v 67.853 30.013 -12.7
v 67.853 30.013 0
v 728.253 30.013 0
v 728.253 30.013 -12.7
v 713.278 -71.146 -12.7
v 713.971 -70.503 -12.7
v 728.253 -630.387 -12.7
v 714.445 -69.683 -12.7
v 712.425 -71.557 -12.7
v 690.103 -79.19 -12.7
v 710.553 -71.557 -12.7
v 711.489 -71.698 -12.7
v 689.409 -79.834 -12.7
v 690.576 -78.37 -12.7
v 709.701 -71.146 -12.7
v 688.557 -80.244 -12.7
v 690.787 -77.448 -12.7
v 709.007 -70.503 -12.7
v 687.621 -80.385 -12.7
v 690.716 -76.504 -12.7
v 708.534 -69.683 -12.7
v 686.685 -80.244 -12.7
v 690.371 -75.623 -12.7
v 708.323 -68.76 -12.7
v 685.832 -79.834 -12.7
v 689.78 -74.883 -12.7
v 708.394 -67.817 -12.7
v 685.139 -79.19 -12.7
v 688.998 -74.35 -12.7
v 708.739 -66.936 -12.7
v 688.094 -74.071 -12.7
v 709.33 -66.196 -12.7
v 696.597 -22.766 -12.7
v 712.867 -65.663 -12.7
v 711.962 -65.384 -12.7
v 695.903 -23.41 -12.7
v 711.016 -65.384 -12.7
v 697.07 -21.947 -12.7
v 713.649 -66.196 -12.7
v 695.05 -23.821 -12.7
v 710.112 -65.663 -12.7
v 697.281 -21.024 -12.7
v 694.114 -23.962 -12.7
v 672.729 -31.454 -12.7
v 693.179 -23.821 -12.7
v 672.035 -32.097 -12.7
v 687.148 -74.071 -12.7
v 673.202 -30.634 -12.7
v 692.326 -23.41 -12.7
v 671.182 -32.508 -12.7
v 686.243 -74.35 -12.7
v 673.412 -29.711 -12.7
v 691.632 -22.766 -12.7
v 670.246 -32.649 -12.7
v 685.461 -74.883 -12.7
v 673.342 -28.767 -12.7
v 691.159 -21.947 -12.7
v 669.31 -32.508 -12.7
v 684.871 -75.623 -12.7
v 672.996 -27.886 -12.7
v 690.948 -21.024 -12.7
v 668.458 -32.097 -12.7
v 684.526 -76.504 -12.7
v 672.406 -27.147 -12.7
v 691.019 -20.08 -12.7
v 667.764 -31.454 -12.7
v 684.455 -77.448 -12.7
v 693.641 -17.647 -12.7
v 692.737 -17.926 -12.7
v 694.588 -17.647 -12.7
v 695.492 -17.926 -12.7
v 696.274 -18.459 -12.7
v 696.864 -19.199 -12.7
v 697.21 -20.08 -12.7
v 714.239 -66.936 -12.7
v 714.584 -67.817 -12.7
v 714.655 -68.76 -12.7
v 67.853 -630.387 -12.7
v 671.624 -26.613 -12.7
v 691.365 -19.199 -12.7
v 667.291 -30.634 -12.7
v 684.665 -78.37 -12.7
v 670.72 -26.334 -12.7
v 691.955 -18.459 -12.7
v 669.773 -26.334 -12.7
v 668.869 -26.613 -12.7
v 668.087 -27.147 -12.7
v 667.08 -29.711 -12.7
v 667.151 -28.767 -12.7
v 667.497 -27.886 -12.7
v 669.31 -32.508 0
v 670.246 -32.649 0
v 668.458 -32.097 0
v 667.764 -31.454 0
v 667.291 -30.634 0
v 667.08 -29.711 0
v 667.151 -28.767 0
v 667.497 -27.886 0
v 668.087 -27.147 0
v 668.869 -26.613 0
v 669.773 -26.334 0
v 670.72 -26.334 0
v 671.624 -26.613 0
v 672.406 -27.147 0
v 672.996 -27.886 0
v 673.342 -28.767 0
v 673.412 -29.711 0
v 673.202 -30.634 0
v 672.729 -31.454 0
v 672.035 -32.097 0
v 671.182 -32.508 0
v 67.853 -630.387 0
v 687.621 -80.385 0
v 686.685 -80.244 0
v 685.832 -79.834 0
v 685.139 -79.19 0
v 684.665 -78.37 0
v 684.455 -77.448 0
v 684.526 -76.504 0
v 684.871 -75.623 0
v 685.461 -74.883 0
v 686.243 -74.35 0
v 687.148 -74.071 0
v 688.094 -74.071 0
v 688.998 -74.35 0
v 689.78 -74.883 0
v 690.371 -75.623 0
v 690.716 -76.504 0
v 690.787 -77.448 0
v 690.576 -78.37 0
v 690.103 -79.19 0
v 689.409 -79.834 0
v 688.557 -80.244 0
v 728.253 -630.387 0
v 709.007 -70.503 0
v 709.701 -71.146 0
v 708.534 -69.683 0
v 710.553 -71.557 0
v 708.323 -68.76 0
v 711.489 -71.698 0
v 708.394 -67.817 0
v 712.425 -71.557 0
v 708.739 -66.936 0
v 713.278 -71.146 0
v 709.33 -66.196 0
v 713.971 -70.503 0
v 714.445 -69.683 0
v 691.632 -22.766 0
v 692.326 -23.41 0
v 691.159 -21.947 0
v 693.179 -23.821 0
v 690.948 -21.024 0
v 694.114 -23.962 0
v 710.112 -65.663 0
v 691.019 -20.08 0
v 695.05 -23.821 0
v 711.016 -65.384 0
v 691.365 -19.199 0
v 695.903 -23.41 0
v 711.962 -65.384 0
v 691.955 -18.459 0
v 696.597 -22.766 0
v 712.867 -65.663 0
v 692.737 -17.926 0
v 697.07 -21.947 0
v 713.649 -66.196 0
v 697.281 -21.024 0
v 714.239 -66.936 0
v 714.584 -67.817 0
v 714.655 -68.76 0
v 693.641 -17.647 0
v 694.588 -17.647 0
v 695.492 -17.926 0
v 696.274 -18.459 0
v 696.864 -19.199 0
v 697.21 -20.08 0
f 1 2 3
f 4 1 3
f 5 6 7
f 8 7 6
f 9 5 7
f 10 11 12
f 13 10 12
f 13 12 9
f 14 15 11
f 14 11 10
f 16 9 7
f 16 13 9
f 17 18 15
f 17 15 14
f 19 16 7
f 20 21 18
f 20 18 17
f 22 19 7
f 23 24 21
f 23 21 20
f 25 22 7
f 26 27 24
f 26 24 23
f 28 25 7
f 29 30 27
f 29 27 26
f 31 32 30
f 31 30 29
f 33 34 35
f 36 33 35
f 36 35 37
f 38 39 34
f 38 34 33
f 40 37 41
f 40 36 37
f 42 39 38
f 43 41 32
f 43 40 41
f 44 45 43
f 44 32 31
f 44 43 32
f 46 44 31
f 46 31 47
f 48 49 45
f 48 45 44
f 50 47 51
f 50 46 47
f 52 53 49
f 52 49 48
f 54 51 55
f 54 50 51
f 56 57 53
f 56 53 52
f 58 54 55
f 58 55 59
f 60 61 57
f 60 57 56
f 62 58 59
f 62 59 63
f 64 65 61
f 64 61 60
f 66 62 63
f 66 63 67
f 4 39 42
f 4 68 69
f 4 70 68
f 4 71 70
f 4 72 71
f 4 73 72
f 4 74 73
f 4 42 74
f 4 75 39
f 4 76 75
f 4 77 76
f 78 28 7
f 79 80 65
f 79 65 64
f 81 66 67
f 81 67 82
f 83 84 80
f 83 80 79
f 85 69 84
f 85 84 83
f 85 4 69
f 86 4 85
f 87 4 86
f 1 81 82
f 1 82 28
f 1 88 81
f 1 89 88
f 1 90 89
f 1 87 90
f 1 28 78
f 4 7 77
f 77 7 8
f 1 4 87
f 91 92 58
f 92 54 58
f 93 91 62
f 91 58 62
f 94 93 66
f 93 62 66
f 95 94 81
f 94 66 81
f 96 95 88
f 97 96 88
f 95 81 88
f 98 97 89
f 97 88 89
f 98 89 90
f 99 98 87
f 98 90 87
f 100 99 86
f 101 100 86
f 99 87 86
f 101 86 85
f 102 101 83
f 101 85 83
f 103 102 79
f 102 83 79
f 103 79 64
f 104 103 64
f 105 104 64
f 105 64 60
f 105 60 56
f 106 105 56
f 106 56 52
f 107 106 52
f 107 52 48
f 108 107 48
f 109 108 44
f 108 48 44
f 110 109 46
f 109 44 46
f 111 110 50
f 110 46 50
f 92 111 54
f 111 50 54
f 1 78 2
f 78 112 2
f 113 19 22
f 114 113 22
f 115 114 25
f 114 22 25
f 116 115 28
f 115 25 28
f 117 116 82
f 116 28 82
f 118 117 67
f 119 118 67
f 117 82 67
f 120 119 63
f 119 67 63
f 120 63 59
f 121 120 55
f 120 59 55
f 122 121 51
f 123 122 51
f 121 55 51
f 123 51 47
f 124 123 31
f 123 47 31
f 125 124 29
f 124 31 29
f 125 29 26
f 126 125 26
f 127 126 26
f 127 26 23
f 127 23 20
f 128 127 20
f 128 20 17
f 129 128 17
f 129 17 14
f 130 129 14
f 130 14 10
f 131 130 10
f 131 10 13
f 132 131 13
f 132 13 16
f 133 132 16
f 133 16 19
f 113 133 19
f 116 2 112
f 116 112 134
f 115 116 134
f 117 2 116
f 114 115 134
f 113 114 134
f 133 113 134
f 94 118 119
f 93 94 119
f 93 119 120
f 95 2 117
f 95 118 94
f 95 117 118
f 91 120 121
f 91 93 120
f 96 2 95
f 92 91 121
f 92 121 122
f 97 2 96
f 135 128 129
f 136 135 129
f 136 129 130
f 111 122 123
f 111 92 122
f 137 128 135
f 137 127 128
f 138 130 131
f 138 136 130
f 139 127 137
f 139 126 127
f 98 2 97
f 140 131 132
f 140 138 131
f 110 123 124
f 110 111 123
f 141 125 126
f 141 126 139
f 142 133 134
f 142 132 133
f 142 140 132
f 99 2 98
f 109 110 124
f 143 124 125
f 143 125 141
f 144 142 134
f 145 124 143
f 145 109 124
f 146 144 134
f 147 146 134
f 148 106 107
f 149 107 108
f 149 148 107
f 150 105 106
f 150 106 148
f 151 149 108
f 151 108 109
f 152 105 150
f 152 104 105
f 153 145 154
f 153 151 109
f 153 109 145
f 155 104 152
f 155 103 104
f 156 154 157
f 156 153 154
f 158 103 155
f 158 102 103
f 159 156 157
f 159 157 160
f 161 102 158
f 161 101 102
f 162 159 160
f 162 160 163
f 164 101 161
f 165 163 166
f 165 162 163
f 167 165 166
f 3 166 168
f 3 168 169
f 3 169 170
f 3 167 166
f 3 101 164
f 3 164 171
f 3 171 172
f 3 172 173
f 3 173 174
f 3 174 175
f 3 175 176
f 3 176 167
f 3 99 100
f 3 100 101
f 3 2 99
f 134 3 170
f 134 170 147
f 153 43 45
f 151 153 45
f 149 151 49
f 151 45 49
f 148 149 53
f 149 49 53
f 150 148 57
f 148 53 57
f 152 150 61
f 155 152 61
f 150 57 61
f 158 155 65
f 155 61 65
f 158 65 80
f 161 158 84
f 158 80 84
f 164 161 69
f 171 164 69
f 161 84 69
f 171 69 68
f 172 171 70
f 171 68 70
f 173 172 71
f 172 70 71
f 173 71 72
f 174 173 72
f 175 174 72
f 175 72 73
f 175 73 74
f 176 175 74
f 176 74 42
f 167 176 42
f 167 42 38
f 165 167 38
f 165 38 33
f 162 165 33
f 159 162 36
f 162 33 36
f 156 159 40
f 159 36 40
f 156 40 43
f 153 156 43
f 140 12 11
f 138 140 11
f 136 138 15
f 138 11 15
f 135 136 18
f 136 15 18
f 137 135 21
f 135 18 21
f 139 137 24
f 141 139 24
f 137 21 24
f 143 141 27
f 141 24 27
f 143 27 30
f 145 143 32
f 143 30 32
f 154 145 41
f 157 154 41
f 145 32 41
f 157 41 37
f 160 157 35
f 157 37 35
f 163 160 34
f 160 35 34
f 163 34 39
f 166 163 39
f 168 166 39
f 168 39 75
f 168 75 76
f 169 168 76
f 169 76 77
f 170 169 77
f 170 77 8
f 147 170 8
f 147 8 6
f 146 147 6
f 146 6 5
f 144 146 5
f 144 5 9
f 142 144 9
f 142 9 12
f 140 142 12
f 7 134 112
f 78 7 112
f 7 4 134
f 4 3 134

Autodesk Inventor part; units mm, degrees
ref_plane "YZ Plane" through (0, 0, 0) normal (1, 0, 0) x (0, 1, 0)
ref_plane "XZ Plane" through (0, 0, 0) normal (0, 1, 0) x (-1, 0, 0)
ref_plane "XY Plane" through (0, 0, 0) normal (0, 0, 1) x (1, 0, 0)
sketch "Sketch1" plane through (0, 0, 0) normal (0, 0, 1) x (1, 0, 0)
  line L0 (67.8531, 30.0133) -> (728.2531, 30.0133)
  line L1 (728.2531, 30.0133) -> (728.2531, -731.9867)
  line L2 (728.2531, -731.9867) -> (67.8531, -731.9867)
  line L3 (67.8531, -731.9867) -> (67.8531, 30.0133)
  point P0 (0, 0)
  dimension "d0" = 660.4
  dimension "d1" = 762
extrude "Extrusion1" add sketch "Sketch1" against normal blind 25.4
sketch "Sketch2" plane through (0, 0, 0) normal (0, 0, 1) x (1, 0, 0)
  line L0 (728.2531, 30.0133) -> (728.2531, -731.9867) projected
  line L1 (67.8531, 30.0133) -> (728.2531, 30.0133) projected
  line L2 (670.2463, -29.474) -> (694.1145, -20.7867)
  line L3 (694.1145, -20.7867) -> (711.4891, -68.5231)
  line L4 (711.4891, -68.5231) -> (687.6209, -77.2104)
  line L5 (687.6209, -77.2104) -> (670.2463, -29.474)
  point P0 (0, 0)
  dimension "d29" = 25.4
  dimension "d30" = 50.8
  dimension "d31" = 70
  dimension "d32" = 50.8
  dimension "d33" = 16.764
hole "Hole2" at (670.2463, -29.474, 0) at (694.1145, -20.7867, 0) at (711.4891, -68.5231, 0) at (687.6209, -77.2104, 0) direction (0, 0, -1) diameter 6.35 depth 25.4 tip angle 118
sketch "Sketch3" plane through (0, 0, 0) normal (0, 0, 1) x (1, 0, 0)
  line L0 (728.2531, 30.0133) -> (728.2531, -731.9867) projected
  line L1 (67.8531, -731.9867) -> (728.2531, -731.9867)
  line L2 (728.2531, -731.9867) -> (728.2531, -630.3867)
  line L3 (728.2531, -630.3867) -> (67.8531, -630.3867)
  line L4 (67.8531, -630.3867) -> (67.8531, -731.9867)
  point P0 (0, 0)
  dimension "d41" = 101.6
extrude "Extrusion2" cut sketch "Sketch3" against normal blind 25.4
sketch "Sketch4" plane through (67.8531, 30.0133, 0) normal (0, 1, 0) x (1, 0, 0)
  line L0 (660.4, 0) -> (660.4, 25.4) projected
  line L1 (0, 25.4) -> (660.4, 25.4)
  line L2 (660.4, 25.4) -> (660.4, 12.7)
  line L3 (660.4, 12.7) -> (0, 12.7)
  line L4 (0, 12.7) -> (0, 25.4)
  line L5 (660.4, 25.4) -> (0, 25.4) projected
  line L6 (0, 0) -> (0, 25.4) projected
  line L7 (0, 0) -> (660.4, 0) projected
  line L8 (660.4, 0) -> (660.4, 25.4) projected
  point P0 (-67.8531, 0)
extrude "Extrusion3" cut sketch "Sketch4" against normal blind 762 contours L3 L4 L1 L0
properties part number "ajustableBase w mounting holes"
